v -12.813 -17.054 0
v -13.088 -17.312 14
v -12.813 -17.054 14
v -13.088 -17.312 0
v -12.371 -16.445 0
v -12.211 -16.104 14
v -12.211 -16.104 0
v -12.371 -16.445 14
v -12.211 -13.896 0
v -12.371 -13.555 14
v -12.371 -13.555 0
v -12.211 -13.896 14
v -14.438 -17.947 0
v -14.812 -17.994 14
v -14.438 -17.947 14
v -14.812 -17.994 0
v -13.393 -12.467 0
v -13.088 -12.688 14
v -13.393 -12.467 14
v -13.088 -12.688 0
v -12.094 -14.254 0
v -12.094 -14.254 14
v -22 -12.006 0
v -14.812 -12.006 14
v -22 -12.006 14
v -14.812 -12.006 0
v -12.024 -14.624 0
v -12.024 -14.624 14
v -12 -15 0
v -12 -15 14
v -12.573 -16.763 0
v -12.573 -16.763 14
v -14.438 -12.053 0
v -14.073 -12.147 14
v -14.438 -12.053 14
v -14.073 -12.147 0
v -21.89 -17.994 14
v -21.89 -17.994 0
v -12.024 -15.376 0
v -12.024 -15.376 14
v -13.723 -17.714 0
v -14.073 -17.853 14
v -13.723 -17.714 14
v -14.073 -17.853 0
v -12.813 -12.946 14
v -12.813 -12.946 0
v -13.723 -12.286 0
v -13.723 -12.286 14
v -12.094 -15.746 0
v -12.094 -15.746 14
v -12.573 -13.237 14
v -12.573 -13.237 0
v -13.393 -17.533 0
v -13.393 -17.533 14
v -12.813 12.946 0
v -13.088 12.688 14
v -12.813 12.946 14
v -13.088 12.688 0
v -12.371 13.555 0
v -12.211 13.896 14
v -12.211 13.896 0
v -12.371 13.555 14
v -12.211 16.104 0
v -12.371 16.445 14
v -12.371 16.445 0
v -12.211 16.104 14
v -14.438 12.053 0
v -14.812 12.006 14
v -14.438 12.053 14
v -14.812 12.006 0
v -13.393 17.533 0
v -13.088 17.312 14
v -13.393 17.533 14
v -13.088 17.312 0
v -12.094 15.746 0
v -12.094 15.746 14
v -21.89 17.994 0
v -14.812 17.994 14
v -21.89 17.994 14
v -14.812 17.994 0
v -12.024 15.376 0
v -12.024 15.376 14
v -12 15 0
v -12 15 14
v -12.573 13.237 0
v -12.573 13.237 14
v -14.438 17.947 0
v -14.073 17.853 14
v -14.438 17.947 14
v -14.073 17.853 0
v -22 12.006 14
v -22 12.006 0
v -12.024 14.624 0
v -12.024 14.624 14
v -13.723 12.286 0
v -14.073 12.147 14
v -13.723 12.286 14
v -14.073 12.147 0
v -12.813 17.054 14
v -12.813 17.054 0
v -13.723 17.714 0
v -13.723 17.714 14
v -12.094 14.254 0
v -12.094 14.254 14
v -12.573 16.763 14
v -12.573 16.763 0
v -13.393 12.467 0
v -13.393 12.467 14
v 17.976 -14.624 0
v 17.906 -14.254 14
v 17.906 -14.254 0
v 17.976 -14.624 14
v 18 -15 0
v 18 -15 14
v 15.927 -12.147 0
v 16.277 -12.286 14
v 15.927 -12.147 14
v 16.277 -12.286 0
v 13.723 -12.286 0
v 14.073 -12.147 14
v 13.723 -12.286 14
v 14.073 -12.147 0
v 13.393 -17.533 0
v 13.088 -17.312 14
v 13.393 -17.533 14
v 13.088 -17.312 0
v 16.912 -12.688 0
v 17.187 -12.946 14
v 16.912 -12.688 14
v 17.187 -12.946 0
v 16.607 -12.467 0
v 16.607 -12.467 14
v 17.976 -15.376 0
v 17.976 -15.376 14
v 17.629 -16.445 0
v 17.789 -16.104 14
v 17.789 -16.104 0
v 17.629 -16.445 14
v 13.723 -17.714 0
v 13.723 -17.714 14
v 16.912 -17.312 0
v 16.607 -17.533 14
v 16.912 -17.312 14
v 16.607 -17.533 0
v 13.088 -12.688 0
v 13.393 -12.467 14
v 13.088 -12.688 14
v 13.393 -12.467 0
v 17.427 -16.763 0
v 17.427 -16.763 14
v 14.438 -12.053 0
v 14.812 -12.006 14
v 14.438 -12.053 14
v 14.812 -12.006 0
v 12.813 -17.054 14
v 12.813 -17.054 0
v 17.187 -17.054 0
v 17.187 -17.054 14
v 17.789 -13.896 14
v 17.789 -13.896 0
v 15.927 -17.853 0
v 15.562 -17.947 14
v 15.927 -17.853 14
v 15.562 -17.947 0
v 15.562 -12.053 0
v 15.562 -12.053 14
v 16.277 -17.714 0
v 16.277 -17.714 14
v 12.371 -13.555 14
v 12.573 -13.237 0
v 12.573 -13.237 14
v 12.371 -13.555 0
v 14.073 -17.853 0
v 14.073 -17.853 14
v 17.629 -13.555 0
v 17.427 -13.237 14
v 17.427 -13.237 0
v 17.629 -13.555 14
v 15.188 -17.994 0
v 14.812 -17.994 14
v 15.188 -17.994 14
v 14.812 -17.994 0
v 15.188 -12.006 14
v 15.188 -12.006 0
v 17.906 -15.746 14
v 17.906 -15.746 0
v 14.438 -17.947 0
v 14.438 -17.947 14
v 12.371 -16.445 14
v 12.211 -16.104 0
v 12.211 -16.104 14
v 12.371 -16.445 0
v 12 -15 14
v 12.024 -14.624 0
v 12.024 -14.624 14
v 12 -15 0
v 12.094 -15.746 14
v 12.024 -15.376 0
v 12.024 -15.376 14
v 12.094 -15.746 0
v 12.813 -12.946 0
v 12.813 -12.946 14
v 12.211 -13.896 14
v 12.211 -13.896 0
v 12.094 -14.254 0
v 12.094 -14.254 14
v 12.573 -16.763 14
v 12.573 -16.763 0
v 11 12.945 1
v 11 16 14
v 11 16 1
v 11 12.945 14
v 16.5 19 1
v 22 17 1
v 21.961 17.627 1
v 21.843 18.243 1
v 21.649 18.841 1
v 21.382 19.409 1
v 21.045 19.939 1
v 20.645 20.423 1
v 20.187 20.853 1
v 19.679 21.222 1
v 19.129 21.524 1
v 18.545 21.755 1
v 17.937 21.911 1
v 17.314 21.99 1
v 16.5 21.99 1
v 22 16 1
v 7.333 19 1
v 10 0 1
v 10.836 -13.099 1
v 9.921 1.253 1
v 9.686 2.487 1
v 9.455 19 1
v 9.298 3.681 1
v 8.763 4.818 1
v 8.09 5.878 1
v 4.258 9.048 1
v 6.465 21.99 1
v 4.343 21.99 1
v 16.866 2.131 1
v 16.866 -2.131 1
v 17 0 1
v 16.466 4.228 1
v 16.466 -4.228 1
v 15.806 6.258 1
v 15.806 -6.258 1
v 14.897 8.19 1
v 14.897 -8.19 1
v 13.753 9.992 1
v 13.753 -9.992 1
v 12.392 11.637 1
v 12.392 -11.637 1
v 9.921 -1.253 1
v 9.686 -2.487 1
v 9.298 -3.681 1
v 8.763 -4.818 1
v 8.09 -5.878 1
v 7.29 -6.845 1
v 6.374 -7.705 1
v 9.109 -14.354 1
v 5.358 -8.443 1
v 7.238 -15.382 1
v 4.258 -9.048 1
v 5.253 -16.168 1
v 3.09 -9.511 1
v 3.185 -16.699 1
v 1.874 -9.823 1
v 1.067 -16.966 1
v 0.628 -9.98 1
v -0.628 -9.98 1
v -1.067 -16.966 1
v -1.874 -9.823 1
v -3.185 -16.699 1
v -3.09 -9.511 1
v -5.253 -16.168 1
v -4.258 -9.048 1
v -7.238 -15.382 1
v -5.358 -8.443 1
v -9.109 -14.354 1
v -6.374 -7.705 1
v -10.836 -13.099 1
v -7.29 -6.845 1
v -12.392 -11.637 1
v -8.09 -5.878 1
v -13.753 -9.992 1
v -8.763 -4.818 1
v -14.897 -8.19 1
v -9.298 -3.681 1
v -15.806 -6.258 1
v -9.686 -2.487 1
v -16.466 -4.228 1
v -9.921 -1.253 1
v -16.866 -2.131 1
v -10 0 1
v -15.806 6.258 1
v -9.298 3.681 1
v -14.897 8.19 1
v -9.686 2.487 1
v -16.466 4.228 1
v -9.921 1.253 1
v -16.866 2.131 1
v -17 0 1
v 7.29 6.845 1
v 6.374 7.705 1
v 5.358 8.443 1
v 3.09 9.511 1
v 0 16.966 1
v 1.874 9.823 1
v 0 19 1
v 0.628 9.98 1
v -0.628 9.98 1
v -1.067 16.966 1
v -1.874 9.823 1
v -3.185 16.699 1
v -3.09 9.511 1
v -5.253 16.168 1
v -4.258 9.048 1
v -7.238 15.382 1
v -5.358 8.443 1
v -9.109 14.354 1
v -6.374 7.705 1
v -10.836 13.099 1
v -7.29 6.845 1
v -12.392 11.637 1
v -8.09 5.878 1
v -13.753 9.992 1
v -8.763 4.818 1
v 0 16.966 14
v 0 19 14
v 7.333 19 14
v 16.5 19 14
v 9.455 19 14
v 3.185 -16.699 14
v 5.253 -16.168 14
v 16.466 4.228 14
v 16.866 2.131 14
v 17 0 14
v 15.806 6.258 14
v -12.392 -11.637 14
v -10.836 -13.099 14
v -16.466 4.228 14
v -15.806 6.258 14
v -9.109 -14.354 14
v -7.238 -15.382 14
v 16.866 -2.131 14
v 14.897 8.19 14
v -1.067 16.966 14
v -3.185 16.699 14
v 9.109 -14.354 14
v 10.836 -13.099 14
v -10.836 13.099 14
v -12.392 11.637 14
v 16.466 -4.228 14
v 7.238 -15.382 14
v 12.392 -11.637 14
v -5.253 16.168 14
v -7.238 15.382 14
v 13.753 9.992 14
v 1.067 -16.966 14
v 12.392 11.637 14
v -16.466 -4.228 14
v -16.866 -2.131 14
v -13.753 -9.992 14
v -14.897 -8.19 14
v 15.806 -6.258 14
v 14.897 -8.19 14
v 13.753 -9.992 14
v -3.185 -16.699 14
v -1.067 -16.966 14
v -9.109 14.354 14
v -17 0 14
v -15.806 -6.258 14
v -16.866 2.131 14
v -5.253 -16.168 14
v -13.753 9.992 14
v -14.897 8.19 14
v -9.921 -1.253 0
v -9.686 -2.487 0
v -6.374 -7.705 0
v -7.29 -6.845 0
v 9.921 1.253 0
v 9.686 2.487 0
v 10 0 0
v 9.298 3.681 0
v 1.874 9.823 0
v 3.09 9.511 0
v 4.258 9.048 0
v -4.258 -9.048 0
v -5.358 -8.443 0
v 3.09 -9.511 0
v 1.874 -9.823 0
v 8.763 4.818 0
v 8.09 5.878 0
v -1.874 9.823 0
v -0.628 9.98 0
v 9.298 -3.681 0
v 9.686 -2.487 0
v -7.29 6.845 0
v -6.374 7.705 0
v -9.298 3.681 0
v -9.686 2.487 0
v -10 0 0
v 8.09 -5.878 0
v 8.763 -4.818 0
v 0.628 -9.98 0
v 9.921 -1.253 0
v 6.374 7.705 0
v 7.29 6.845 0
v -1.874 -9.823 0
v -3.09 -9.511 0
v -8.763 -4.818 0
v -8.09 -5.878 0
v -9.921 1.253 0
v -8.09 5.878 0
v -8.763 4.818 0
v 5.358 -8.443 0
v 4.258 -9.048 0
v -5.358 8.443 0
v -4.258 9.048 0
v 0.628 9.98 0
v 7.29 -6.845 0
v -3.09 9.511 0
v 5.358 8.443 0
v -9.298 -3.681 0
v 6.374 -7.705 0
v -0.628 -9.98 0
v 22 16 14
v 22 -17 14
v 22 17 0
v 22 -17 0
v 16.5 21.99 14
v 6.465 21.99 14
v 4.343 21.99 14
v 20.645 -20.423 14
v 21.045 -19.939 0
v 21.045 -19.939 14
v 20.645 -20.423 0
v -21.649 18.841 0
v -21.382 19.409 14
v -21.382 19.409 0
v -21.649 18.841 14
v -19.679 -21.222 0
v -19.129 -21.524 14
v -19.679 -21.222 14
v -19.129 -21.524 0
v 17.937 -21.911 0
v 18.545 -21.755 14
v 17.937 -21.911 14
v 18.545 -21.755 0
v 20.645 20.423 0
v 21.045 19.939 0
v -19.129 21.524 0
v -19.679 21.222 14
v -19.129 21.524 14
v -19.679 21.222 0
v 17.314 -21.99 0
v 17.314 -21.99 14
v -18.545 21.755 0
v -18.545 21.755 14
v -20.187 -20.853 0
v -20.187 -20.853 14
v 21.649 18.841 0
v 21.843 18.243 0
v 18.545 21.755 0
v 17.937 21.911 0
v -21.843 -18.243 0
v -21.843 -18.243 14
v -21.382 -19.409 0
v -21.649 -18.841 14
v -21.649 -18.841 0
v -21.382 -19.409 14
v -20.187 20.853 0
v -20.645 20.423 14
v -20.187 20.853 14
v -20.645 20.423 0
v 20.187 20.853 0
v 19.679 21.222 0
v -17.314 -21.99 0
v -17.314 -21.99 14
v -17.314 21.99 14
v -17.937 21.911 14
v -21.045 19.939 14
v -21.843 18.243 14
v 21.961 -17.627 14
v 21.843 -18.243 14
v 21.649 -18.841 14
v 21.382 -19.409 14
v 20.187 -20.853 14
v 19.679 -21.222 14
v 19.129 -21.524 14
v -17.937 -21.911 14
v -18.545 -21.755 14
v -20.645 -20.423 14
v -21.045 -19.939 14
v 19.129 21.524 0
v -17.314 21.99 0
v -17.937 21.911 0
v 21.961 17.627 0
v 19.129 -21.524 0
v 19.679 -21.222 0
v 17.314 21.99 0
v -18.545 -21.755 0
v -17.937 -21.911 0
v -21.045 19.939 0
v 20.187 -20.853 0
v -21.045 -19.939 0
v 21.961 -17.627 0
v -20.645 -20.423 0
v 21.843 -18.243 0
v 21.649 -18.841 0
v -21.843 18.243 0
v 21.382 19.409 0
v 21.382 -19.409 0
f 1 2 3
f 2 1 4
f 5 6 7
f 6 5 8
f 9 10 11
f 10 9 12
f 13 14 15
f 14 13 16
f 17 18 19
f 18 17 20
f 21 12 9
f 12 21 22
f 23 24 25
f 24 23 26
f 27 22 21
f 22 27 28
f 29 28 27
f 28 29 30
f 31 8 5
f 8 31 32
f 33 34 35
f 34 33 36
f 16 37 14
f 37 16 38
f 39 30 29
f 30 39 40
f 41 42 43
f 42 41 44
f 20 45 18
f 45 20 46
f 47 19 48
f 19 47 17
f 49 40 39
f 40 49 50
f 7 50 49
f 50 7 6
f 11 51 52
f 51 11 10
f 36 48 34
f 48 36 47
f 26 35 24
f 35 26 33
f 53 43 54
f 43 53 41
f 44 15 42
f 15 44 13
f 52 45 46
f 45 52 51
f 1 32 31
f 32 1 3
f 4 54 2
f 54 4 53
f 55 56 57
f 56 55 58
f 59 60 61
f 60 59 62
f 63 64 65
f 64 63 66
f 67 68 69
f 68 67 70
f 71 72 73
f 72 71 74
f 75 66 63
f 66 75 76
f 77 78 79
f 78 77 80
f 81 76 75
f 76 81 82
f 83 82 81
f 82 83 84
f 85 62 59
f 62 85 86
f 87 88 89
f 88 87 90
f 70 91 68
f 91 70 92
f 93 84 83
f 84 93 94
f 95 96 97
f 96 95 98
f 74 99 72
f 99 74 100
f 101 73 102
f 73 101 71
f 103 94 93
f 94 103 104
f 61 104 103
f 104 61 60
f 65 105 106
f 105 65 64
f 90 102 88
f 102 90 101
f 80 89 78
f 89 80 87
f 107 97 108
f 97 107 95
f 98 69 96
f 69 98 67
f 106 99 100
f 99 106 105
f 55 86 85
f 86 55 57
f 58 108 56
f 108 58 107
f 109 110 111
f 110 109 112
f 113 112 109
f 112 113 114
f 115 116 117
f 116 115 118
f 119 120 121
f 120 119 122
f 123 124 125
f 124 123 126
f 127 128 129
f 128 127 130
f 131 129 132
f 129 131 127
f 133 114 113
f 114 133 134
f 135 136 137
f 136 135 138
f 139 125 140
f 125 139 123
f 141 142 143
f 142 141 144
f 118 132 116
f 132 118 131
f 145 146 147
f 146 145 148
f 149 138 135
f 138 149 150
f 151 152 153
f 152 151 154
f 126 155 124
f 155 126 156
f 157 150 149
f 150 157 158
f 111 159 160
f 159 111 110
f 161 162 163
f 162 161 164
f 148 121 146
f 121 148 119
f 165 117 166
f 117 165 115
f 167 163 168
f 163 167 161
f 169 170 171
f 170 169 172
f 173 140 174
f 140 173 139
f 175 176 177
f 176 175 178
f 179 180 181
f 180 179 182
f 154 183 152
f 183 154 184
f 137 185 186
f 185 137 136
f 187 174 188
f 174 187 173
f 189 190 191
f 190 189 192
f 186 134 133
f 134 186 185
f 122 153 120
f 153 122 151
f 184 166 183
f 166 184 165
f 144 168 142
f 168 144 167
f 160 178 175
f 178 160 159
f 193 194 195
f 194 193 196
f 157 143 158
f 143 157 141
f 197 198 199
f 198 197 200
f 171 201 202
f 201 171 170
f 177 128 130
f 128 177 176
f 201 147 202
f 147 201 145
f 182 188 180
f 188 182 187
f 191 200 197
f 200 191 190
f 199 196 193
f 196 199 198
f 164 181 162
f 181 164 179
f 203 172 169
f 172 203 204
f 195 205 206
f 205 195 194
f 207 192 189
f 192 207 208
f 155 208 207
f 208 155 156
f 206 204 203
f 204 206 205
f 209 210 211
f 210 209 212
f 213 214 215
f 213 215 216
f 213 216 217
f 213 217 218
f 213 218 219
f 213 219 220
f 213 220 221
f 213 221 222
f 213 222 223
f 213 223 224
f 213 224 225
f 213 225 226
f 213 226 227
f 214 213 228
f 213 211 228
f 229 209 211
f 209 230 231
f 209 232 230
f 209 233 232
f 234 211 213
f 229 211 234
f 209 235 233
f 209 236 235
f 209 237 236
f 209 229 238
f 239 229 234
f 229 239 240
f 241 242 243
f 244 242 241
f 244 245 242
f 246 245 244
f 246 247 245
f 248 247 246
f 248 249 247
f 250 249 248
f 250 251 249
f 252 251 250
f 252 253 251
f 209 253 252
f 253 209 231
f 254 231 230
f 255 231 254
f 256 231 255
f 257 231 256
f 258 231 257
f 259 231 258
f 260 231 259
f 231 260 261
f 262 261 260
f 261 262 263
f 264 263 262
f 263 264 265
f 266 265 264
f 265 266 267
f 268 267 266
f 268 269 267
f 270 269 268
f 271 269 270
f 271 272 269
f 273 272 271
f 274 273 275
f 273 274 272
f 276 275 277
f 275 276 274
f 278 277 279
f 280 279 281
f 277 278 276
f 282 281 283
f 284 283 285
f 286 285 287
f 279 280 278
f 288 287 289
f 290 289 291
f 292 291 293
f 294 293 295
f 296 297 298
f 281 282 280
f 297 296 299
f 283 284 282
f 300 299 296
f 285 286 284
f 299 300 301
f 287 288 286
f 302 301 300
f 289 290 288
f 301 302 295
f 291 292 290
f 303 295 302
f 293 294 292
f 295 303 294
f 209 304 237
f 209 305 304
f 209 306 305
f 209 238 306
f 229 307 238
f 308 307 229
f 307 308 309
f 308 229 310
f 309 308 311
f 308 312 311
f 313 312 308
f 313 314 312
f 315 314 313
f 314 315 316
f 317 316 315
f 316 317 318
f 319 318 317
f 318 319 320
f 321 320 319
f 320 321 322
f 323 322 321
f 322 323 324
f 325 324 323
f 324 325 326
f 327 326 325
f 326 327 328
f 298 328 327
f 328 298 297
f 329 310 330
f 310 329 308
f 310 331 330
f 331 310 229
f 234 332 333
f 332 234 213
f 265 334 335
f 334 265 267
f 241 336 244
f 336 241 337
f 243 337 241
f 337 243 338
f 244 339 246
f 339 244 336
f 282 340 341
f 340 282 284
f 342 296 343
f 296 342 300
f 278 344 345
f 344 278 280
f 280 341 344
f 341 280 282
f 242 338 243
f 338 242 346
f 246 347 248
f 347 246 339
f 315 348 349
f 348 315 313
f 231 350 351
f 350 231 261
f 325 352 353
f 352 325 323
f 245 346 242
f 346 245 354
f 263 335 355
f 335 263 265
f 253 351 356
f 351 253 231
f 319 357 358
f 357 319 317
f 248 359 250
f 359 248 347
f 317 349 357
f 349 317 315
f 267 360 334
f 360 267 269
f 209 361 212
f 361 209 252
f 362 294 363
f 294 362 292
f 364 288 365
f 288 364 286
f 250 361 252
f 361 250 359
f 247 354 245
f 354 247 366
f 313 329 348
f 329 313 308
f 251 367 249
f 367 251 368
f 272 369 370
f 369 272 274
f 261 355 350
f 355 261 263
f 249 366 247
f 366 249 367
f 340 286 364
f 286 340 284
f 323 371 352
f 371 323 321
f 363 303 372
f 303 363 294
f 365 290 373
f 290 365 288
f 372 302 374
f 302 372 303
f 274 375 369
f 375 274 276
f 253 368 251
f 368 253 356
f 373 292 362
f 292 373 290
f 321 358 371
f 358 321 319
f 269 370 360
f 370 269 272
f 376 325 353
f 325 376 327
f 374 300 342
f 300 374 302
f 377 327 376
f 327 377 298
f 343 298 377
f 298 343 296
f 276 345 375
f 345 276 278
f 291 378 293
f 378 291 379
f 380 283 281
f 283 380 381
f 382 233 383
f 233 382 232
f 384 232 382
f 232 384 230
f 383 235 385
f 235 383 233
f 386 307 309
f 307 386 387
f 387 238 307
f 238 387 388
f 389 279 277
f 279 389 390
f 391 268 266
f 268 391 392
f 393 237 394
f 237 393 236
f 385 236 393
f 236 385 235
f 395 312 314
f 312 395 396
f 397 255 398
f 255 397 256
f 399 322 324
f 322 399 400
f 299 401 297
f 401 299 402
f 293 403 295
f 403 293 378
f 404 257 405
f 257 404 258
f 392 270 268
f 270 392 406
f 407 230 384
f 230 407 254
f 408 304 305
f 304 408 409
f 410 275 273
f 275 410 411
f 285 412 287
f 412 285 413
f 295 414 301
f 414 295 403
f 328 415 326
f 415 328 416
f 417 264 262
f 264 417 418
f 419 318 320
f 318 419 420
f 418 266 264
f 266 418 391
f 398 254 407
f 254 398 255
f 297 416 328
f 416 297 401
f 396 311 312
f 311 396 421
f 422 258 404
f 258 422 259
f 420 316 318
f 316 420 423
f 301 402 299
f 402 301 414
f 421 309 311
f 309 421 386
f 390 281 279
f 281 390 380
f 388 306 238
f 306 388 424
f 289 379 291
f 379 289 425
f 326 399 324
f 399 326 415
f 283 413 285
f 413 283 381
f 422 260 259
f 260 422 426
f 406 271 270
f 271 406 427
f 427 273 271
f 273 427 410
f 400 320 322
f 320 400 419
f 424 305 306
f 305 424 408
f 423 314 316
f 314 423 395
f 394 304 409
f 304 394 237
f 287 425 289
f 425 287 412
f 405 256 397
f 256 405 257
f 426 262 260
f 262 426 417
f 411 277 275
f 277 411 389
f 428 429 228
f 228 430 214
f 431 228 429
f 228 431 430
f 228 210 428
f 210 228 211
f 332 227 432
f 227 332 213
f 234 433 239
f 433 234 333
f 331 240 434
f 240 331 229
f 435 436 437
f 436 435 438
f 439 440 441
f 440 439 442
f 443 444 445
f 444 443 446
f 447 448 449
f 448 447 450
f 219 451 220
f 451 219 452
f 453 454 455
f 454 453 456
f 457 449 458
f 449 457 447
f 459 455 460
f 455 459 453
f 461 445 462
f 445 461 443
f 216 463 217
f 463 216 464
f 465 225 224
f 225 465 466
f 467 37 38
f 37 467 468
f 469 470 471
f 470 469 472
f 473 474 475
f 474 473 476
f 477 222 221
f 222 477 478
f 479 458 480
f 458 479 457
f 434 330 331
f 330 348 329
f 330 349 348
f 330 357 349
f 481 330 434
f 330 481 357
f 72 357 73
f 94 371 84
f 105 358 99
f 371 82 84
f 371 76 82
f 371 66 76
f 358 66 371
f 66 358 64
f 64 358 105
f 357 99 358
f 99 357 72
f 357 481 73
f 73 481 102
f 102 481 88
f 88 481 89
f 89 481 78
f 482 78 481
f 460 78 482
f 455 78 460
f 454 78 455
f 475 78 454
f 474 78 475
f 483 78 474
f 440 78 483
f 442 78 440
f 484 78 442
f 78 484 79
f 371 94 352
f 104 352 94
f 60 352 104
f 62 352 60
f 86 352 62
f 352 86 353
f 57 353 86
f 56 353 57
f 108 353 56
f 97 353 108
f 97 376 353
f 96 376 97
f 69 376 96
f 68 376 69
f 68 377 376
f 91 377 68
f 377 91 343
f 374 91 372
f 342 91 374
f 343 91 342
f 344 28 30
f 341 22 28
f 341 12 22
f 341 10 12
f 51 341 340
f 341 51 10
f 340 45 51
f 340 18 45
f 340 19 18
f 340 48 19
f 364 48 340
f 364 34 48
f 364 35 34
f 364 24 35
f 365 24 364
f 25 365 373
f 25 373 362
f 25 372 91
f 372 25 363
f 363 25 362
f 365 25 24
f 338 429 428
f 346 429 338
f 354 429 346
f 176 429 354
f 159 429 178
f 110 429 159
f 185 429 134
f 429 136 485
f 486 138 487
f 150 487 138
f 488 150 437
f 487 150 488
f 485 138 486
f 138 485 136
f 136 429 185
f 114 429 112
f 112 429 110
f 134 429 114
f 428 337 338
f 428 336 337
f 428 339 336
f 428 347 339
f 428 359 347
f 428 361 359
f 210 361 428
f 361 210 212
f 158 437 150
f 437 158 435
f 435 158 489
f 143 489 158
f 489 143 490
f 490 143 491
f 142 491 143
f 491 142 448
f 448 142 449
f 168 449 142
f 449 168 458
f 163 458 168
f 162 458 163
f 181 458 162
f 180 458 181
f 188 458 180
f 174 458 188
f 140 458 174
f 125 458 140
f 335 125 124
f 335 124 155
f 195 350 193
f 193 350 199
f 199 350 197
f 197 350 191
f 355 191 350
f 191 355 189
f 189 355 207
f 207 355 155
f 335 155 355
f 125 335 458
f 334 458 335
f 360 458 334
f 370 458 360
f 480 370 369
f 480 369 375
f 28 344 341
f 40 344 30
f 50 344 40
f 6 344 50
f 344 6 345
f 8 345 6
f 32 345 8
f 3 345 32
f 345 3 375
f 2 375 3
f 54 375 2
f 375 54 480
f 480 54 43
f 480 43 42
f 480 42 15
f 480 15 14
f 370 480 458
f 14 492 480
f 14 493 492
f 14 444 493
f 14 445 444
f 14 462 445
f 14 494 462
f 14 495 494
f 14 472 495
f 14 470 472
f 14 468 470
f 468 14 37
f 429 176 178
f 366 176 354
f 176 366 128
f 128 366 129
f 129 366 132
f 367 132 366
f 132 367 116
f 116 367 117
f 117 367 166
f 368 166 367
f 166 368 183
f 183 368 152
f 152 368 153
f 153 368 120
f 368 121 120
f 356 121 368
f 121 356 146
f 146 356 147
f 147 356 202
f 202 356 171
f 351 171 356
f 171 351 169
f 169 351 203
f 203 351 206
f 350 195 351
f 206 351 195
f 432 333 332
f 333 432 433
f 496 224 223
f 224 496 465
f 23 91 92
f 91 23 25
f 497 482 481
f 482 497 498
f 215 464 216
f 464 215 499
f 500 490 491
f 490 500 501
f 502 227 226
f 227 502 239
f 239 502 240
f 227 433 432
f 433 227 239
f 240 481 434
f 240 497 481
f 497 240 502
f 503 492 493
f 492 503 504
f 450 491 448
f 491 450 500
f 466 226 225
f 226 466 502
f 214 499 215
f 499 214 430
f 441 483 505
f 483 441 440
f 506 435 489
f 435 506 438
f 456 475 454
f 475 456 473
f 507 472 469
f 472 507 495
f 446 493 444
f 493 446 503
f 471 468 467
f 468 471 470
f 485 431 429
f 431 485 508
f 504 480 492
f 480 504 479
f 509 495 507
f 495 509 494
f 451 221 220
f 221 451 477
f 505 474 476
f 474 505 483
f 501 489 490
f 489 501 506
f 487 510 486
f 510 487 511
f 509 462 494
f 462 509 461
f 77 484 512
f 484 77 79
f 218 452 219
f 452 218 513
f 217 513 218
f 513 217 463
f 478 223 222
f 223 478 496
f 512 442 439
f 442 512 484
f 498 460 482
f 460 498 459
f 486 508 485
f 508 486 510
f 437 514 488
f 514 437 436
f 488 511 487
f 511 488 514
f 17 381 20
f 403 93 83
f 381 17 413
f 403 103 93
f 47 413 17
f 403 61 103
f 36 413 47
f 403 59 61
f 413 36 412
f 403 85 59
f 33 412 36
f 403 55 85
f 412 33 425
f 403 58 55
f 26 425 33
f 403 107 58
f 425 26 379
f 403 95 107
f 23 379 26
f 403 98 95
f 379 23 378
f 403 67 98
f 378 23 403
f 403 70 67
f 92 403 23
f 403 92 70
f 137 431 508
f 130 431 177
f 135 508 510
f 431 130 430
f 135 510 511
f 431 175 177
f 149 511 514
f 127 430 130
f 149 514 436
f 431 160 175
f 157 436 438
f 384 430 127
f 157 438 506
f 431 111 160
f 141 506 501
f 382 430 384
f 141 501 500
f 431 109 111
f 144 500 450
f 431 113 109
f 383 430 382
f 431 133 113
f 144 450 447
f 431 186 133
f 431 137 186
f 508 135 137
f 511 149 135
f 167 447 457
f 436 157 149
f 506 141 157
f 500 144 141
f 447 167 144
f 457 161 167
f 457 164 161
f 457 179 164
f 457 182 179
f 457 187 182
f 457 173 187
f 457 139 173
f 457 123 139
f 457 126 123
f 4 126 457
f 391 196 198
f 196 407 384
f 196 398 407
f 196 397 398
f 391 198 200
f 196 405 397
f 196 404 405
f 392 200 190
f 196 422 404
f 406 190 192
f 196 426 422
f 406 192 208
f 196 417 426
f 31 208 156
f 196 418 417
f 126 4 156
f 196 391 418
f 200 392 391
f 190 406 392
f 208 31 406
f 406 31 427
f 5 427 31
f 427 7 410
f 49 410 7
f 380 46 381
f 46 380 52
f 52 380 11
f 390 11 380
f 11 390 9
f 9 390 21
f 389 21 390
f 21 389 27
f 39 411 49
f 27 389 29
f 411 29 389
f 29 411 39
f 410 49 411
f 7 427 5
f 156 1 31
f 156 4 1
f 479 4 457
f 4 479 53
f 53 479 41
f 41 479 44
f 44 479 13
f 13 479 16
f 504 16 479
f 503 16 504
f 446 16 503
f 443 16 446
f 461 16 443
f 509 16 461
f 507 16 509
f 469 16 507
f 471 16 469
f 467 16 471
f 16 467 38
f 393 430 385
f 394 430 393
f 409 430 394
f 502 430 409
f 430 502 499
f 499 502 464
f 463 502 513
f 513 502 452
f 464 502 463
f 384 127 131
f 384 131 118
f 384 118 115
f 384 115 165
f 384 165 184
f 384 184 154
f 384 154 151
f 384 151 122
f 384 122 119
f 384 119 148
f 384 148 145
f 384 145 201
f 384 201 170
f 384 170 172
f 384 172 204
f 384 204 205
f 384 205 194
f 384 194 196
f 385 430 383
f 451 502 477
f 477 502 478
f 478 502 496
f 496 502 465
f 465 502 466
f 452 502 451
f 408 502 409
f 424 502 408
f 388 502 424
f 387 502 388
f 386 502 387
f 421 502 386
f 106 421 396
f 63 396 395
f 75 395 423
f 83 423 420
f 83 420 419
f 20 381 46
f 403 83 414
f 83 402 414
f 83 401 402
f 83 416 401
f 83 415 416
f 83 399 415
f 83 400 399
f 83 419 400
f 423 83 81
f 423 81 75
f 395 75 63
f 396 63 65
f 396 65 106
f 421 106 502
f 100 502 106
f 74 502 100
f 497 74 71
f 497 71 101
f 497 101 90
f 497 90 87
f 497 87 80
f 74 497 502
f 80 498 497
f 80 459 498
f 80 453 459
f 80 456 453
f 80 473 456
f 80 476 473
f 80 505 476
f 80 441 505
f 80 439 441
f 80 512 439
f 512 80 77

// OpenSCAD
$fn = 50;


difference() {
	union() {
		translate(v = [0, 0, 0]) {
			rotate(a = [0, 0, 0]) {
				hull() {
					translate(v = [-17.0000000000, 17.0000000000, 0]) {
						rotate(a = [0, 0, 0]) {
							translate(v = [0, 0, 0]) {
								rotate(a = [0, 0, 0]) {
									cylinder(h = 14, r = 5);
								}
							}
						}
					}
					translate(v = [17.0000000000, 17.0000000000, 0]) {
						rotate(a = [0, 0, 0]) {
							translate(v = [0, 0, 0]) {
								rotate(a = [0, 0, 0]) {
									cylinder(h = 14, r = 5);
								}
							}
						}
					}
					translate(v = [-17.0000000000, -17.0000000000, 0]) {
						rotate(a = [0, 0, 0]) {
							translate(v = [0, 0, 0]) {
								rotate(a = [0, 0, 0]) {
									cylinder(h = 14, r = 5);
								}
							}
						}
					}
					translate(v = [17.0000000000, -17.0000000000, 0]) {
						rotate(a = [0, 0, 0]) {
							translate(v = [0, 0, 0]) {
								rotate(a = [0, 0, 0]) {
									cylinder(h = 14, r = 5);
								}
							}
						}
					}
				}
			}
		}
	}
	union() {
		translate(v = [-22.5000000000, -15.0000000000, -125]) {
			rotate(a = [0, 0, 0]) {
				hull() {
					translate(v = [7.5000000000, 0, 0]) {
						rotate(a = [0, 0, 0]) {
							translate(v = [0, 0, 0]) {
								rotate(a = [0, 0, 0]) {
									cylinder(h = 250, r = 3.0000000000);
								}
							}
						}
					}
					translate(v = [-7.5000000000, 0, 0]) {
						rotate(a = [0, 0, 0]) {
							translate(v = [0, 0, 0]) {
								rotate(a = [0, 0, 0]) {
									cylinder(h = 250, r = 3.0000000000);
								}
							}
						}
					}
				}
			}
		}
		translate(v = [-22.5000000000, 15.0000000000, -125]) {
			rotate(a = [0, 0, 0]) {
				hull() {
					translate(v = [7.5000000000, 0, 0]) {
						rotate(a = [0, 0, 0]) {
							translate(v = [0, 0, 0]) {
								rotate(a = [0, 0, 0]) {
									cylinder(h = 250, r = 3.0000000000);
								}
							}
						}
					}
					translate(v = [-7.5000000000, 0, 0]) {
						rotate(a = [0, 0, 0]) {
							translate(v = [0, 0, 0]) {
								rotate(a = [0, 0, 0]) {
									cylinder(h = 250, r = 3.0000000000);
								}
							}
						}
					}
				}
			}
		}
		translate(v = [15.0000000000, -15.0000000000, -125.0000000000]) {
			rotate(a = [0, 0, 0]) {
				cylinder(h = 250, r = 3.0000000000);
			}
		}
		translate(v = [0.0000000000, 11.0000000000, 1.0000000000]) {
			rotate(a = [0, 0, 0]) {
				cube(size = [11, 8, 16]);
			}
		}
		translate(v = [0, 0, 1.0000000000]) {
			rotate(a = [0, 0, 0]) {
				cylinder(h = 16, r = 17.0000000000);
			}
		}
		translate(v = [0, 0, -7.0000000000]) {
			rotate(a = [0, 0, 0]) {
				cylinder(h = 14, r = 10.0000000000);
			}
		}
		translate(v = [0.0000000000, 16.0000000000, 1]) {
			rotate(a = [0, 0, 0]) {
				cube(size = [22.0000000000, 3, 16]);
			}
		}
		translate(v = [16.5000000000, 16.0000000000, 1]) {
			rotate(a = [0, 0, 0]) {
				cube(size = [5.5000000000, 6, 16]);
			}
		}
		translate(v = [3.5833333333, 22.7500000000, 1]) {
			rotate(a = [0, 0, -45]) {
				cube(size = [7.5000000000, 1.5000000000, 16]);
			}
		}
	}
}
